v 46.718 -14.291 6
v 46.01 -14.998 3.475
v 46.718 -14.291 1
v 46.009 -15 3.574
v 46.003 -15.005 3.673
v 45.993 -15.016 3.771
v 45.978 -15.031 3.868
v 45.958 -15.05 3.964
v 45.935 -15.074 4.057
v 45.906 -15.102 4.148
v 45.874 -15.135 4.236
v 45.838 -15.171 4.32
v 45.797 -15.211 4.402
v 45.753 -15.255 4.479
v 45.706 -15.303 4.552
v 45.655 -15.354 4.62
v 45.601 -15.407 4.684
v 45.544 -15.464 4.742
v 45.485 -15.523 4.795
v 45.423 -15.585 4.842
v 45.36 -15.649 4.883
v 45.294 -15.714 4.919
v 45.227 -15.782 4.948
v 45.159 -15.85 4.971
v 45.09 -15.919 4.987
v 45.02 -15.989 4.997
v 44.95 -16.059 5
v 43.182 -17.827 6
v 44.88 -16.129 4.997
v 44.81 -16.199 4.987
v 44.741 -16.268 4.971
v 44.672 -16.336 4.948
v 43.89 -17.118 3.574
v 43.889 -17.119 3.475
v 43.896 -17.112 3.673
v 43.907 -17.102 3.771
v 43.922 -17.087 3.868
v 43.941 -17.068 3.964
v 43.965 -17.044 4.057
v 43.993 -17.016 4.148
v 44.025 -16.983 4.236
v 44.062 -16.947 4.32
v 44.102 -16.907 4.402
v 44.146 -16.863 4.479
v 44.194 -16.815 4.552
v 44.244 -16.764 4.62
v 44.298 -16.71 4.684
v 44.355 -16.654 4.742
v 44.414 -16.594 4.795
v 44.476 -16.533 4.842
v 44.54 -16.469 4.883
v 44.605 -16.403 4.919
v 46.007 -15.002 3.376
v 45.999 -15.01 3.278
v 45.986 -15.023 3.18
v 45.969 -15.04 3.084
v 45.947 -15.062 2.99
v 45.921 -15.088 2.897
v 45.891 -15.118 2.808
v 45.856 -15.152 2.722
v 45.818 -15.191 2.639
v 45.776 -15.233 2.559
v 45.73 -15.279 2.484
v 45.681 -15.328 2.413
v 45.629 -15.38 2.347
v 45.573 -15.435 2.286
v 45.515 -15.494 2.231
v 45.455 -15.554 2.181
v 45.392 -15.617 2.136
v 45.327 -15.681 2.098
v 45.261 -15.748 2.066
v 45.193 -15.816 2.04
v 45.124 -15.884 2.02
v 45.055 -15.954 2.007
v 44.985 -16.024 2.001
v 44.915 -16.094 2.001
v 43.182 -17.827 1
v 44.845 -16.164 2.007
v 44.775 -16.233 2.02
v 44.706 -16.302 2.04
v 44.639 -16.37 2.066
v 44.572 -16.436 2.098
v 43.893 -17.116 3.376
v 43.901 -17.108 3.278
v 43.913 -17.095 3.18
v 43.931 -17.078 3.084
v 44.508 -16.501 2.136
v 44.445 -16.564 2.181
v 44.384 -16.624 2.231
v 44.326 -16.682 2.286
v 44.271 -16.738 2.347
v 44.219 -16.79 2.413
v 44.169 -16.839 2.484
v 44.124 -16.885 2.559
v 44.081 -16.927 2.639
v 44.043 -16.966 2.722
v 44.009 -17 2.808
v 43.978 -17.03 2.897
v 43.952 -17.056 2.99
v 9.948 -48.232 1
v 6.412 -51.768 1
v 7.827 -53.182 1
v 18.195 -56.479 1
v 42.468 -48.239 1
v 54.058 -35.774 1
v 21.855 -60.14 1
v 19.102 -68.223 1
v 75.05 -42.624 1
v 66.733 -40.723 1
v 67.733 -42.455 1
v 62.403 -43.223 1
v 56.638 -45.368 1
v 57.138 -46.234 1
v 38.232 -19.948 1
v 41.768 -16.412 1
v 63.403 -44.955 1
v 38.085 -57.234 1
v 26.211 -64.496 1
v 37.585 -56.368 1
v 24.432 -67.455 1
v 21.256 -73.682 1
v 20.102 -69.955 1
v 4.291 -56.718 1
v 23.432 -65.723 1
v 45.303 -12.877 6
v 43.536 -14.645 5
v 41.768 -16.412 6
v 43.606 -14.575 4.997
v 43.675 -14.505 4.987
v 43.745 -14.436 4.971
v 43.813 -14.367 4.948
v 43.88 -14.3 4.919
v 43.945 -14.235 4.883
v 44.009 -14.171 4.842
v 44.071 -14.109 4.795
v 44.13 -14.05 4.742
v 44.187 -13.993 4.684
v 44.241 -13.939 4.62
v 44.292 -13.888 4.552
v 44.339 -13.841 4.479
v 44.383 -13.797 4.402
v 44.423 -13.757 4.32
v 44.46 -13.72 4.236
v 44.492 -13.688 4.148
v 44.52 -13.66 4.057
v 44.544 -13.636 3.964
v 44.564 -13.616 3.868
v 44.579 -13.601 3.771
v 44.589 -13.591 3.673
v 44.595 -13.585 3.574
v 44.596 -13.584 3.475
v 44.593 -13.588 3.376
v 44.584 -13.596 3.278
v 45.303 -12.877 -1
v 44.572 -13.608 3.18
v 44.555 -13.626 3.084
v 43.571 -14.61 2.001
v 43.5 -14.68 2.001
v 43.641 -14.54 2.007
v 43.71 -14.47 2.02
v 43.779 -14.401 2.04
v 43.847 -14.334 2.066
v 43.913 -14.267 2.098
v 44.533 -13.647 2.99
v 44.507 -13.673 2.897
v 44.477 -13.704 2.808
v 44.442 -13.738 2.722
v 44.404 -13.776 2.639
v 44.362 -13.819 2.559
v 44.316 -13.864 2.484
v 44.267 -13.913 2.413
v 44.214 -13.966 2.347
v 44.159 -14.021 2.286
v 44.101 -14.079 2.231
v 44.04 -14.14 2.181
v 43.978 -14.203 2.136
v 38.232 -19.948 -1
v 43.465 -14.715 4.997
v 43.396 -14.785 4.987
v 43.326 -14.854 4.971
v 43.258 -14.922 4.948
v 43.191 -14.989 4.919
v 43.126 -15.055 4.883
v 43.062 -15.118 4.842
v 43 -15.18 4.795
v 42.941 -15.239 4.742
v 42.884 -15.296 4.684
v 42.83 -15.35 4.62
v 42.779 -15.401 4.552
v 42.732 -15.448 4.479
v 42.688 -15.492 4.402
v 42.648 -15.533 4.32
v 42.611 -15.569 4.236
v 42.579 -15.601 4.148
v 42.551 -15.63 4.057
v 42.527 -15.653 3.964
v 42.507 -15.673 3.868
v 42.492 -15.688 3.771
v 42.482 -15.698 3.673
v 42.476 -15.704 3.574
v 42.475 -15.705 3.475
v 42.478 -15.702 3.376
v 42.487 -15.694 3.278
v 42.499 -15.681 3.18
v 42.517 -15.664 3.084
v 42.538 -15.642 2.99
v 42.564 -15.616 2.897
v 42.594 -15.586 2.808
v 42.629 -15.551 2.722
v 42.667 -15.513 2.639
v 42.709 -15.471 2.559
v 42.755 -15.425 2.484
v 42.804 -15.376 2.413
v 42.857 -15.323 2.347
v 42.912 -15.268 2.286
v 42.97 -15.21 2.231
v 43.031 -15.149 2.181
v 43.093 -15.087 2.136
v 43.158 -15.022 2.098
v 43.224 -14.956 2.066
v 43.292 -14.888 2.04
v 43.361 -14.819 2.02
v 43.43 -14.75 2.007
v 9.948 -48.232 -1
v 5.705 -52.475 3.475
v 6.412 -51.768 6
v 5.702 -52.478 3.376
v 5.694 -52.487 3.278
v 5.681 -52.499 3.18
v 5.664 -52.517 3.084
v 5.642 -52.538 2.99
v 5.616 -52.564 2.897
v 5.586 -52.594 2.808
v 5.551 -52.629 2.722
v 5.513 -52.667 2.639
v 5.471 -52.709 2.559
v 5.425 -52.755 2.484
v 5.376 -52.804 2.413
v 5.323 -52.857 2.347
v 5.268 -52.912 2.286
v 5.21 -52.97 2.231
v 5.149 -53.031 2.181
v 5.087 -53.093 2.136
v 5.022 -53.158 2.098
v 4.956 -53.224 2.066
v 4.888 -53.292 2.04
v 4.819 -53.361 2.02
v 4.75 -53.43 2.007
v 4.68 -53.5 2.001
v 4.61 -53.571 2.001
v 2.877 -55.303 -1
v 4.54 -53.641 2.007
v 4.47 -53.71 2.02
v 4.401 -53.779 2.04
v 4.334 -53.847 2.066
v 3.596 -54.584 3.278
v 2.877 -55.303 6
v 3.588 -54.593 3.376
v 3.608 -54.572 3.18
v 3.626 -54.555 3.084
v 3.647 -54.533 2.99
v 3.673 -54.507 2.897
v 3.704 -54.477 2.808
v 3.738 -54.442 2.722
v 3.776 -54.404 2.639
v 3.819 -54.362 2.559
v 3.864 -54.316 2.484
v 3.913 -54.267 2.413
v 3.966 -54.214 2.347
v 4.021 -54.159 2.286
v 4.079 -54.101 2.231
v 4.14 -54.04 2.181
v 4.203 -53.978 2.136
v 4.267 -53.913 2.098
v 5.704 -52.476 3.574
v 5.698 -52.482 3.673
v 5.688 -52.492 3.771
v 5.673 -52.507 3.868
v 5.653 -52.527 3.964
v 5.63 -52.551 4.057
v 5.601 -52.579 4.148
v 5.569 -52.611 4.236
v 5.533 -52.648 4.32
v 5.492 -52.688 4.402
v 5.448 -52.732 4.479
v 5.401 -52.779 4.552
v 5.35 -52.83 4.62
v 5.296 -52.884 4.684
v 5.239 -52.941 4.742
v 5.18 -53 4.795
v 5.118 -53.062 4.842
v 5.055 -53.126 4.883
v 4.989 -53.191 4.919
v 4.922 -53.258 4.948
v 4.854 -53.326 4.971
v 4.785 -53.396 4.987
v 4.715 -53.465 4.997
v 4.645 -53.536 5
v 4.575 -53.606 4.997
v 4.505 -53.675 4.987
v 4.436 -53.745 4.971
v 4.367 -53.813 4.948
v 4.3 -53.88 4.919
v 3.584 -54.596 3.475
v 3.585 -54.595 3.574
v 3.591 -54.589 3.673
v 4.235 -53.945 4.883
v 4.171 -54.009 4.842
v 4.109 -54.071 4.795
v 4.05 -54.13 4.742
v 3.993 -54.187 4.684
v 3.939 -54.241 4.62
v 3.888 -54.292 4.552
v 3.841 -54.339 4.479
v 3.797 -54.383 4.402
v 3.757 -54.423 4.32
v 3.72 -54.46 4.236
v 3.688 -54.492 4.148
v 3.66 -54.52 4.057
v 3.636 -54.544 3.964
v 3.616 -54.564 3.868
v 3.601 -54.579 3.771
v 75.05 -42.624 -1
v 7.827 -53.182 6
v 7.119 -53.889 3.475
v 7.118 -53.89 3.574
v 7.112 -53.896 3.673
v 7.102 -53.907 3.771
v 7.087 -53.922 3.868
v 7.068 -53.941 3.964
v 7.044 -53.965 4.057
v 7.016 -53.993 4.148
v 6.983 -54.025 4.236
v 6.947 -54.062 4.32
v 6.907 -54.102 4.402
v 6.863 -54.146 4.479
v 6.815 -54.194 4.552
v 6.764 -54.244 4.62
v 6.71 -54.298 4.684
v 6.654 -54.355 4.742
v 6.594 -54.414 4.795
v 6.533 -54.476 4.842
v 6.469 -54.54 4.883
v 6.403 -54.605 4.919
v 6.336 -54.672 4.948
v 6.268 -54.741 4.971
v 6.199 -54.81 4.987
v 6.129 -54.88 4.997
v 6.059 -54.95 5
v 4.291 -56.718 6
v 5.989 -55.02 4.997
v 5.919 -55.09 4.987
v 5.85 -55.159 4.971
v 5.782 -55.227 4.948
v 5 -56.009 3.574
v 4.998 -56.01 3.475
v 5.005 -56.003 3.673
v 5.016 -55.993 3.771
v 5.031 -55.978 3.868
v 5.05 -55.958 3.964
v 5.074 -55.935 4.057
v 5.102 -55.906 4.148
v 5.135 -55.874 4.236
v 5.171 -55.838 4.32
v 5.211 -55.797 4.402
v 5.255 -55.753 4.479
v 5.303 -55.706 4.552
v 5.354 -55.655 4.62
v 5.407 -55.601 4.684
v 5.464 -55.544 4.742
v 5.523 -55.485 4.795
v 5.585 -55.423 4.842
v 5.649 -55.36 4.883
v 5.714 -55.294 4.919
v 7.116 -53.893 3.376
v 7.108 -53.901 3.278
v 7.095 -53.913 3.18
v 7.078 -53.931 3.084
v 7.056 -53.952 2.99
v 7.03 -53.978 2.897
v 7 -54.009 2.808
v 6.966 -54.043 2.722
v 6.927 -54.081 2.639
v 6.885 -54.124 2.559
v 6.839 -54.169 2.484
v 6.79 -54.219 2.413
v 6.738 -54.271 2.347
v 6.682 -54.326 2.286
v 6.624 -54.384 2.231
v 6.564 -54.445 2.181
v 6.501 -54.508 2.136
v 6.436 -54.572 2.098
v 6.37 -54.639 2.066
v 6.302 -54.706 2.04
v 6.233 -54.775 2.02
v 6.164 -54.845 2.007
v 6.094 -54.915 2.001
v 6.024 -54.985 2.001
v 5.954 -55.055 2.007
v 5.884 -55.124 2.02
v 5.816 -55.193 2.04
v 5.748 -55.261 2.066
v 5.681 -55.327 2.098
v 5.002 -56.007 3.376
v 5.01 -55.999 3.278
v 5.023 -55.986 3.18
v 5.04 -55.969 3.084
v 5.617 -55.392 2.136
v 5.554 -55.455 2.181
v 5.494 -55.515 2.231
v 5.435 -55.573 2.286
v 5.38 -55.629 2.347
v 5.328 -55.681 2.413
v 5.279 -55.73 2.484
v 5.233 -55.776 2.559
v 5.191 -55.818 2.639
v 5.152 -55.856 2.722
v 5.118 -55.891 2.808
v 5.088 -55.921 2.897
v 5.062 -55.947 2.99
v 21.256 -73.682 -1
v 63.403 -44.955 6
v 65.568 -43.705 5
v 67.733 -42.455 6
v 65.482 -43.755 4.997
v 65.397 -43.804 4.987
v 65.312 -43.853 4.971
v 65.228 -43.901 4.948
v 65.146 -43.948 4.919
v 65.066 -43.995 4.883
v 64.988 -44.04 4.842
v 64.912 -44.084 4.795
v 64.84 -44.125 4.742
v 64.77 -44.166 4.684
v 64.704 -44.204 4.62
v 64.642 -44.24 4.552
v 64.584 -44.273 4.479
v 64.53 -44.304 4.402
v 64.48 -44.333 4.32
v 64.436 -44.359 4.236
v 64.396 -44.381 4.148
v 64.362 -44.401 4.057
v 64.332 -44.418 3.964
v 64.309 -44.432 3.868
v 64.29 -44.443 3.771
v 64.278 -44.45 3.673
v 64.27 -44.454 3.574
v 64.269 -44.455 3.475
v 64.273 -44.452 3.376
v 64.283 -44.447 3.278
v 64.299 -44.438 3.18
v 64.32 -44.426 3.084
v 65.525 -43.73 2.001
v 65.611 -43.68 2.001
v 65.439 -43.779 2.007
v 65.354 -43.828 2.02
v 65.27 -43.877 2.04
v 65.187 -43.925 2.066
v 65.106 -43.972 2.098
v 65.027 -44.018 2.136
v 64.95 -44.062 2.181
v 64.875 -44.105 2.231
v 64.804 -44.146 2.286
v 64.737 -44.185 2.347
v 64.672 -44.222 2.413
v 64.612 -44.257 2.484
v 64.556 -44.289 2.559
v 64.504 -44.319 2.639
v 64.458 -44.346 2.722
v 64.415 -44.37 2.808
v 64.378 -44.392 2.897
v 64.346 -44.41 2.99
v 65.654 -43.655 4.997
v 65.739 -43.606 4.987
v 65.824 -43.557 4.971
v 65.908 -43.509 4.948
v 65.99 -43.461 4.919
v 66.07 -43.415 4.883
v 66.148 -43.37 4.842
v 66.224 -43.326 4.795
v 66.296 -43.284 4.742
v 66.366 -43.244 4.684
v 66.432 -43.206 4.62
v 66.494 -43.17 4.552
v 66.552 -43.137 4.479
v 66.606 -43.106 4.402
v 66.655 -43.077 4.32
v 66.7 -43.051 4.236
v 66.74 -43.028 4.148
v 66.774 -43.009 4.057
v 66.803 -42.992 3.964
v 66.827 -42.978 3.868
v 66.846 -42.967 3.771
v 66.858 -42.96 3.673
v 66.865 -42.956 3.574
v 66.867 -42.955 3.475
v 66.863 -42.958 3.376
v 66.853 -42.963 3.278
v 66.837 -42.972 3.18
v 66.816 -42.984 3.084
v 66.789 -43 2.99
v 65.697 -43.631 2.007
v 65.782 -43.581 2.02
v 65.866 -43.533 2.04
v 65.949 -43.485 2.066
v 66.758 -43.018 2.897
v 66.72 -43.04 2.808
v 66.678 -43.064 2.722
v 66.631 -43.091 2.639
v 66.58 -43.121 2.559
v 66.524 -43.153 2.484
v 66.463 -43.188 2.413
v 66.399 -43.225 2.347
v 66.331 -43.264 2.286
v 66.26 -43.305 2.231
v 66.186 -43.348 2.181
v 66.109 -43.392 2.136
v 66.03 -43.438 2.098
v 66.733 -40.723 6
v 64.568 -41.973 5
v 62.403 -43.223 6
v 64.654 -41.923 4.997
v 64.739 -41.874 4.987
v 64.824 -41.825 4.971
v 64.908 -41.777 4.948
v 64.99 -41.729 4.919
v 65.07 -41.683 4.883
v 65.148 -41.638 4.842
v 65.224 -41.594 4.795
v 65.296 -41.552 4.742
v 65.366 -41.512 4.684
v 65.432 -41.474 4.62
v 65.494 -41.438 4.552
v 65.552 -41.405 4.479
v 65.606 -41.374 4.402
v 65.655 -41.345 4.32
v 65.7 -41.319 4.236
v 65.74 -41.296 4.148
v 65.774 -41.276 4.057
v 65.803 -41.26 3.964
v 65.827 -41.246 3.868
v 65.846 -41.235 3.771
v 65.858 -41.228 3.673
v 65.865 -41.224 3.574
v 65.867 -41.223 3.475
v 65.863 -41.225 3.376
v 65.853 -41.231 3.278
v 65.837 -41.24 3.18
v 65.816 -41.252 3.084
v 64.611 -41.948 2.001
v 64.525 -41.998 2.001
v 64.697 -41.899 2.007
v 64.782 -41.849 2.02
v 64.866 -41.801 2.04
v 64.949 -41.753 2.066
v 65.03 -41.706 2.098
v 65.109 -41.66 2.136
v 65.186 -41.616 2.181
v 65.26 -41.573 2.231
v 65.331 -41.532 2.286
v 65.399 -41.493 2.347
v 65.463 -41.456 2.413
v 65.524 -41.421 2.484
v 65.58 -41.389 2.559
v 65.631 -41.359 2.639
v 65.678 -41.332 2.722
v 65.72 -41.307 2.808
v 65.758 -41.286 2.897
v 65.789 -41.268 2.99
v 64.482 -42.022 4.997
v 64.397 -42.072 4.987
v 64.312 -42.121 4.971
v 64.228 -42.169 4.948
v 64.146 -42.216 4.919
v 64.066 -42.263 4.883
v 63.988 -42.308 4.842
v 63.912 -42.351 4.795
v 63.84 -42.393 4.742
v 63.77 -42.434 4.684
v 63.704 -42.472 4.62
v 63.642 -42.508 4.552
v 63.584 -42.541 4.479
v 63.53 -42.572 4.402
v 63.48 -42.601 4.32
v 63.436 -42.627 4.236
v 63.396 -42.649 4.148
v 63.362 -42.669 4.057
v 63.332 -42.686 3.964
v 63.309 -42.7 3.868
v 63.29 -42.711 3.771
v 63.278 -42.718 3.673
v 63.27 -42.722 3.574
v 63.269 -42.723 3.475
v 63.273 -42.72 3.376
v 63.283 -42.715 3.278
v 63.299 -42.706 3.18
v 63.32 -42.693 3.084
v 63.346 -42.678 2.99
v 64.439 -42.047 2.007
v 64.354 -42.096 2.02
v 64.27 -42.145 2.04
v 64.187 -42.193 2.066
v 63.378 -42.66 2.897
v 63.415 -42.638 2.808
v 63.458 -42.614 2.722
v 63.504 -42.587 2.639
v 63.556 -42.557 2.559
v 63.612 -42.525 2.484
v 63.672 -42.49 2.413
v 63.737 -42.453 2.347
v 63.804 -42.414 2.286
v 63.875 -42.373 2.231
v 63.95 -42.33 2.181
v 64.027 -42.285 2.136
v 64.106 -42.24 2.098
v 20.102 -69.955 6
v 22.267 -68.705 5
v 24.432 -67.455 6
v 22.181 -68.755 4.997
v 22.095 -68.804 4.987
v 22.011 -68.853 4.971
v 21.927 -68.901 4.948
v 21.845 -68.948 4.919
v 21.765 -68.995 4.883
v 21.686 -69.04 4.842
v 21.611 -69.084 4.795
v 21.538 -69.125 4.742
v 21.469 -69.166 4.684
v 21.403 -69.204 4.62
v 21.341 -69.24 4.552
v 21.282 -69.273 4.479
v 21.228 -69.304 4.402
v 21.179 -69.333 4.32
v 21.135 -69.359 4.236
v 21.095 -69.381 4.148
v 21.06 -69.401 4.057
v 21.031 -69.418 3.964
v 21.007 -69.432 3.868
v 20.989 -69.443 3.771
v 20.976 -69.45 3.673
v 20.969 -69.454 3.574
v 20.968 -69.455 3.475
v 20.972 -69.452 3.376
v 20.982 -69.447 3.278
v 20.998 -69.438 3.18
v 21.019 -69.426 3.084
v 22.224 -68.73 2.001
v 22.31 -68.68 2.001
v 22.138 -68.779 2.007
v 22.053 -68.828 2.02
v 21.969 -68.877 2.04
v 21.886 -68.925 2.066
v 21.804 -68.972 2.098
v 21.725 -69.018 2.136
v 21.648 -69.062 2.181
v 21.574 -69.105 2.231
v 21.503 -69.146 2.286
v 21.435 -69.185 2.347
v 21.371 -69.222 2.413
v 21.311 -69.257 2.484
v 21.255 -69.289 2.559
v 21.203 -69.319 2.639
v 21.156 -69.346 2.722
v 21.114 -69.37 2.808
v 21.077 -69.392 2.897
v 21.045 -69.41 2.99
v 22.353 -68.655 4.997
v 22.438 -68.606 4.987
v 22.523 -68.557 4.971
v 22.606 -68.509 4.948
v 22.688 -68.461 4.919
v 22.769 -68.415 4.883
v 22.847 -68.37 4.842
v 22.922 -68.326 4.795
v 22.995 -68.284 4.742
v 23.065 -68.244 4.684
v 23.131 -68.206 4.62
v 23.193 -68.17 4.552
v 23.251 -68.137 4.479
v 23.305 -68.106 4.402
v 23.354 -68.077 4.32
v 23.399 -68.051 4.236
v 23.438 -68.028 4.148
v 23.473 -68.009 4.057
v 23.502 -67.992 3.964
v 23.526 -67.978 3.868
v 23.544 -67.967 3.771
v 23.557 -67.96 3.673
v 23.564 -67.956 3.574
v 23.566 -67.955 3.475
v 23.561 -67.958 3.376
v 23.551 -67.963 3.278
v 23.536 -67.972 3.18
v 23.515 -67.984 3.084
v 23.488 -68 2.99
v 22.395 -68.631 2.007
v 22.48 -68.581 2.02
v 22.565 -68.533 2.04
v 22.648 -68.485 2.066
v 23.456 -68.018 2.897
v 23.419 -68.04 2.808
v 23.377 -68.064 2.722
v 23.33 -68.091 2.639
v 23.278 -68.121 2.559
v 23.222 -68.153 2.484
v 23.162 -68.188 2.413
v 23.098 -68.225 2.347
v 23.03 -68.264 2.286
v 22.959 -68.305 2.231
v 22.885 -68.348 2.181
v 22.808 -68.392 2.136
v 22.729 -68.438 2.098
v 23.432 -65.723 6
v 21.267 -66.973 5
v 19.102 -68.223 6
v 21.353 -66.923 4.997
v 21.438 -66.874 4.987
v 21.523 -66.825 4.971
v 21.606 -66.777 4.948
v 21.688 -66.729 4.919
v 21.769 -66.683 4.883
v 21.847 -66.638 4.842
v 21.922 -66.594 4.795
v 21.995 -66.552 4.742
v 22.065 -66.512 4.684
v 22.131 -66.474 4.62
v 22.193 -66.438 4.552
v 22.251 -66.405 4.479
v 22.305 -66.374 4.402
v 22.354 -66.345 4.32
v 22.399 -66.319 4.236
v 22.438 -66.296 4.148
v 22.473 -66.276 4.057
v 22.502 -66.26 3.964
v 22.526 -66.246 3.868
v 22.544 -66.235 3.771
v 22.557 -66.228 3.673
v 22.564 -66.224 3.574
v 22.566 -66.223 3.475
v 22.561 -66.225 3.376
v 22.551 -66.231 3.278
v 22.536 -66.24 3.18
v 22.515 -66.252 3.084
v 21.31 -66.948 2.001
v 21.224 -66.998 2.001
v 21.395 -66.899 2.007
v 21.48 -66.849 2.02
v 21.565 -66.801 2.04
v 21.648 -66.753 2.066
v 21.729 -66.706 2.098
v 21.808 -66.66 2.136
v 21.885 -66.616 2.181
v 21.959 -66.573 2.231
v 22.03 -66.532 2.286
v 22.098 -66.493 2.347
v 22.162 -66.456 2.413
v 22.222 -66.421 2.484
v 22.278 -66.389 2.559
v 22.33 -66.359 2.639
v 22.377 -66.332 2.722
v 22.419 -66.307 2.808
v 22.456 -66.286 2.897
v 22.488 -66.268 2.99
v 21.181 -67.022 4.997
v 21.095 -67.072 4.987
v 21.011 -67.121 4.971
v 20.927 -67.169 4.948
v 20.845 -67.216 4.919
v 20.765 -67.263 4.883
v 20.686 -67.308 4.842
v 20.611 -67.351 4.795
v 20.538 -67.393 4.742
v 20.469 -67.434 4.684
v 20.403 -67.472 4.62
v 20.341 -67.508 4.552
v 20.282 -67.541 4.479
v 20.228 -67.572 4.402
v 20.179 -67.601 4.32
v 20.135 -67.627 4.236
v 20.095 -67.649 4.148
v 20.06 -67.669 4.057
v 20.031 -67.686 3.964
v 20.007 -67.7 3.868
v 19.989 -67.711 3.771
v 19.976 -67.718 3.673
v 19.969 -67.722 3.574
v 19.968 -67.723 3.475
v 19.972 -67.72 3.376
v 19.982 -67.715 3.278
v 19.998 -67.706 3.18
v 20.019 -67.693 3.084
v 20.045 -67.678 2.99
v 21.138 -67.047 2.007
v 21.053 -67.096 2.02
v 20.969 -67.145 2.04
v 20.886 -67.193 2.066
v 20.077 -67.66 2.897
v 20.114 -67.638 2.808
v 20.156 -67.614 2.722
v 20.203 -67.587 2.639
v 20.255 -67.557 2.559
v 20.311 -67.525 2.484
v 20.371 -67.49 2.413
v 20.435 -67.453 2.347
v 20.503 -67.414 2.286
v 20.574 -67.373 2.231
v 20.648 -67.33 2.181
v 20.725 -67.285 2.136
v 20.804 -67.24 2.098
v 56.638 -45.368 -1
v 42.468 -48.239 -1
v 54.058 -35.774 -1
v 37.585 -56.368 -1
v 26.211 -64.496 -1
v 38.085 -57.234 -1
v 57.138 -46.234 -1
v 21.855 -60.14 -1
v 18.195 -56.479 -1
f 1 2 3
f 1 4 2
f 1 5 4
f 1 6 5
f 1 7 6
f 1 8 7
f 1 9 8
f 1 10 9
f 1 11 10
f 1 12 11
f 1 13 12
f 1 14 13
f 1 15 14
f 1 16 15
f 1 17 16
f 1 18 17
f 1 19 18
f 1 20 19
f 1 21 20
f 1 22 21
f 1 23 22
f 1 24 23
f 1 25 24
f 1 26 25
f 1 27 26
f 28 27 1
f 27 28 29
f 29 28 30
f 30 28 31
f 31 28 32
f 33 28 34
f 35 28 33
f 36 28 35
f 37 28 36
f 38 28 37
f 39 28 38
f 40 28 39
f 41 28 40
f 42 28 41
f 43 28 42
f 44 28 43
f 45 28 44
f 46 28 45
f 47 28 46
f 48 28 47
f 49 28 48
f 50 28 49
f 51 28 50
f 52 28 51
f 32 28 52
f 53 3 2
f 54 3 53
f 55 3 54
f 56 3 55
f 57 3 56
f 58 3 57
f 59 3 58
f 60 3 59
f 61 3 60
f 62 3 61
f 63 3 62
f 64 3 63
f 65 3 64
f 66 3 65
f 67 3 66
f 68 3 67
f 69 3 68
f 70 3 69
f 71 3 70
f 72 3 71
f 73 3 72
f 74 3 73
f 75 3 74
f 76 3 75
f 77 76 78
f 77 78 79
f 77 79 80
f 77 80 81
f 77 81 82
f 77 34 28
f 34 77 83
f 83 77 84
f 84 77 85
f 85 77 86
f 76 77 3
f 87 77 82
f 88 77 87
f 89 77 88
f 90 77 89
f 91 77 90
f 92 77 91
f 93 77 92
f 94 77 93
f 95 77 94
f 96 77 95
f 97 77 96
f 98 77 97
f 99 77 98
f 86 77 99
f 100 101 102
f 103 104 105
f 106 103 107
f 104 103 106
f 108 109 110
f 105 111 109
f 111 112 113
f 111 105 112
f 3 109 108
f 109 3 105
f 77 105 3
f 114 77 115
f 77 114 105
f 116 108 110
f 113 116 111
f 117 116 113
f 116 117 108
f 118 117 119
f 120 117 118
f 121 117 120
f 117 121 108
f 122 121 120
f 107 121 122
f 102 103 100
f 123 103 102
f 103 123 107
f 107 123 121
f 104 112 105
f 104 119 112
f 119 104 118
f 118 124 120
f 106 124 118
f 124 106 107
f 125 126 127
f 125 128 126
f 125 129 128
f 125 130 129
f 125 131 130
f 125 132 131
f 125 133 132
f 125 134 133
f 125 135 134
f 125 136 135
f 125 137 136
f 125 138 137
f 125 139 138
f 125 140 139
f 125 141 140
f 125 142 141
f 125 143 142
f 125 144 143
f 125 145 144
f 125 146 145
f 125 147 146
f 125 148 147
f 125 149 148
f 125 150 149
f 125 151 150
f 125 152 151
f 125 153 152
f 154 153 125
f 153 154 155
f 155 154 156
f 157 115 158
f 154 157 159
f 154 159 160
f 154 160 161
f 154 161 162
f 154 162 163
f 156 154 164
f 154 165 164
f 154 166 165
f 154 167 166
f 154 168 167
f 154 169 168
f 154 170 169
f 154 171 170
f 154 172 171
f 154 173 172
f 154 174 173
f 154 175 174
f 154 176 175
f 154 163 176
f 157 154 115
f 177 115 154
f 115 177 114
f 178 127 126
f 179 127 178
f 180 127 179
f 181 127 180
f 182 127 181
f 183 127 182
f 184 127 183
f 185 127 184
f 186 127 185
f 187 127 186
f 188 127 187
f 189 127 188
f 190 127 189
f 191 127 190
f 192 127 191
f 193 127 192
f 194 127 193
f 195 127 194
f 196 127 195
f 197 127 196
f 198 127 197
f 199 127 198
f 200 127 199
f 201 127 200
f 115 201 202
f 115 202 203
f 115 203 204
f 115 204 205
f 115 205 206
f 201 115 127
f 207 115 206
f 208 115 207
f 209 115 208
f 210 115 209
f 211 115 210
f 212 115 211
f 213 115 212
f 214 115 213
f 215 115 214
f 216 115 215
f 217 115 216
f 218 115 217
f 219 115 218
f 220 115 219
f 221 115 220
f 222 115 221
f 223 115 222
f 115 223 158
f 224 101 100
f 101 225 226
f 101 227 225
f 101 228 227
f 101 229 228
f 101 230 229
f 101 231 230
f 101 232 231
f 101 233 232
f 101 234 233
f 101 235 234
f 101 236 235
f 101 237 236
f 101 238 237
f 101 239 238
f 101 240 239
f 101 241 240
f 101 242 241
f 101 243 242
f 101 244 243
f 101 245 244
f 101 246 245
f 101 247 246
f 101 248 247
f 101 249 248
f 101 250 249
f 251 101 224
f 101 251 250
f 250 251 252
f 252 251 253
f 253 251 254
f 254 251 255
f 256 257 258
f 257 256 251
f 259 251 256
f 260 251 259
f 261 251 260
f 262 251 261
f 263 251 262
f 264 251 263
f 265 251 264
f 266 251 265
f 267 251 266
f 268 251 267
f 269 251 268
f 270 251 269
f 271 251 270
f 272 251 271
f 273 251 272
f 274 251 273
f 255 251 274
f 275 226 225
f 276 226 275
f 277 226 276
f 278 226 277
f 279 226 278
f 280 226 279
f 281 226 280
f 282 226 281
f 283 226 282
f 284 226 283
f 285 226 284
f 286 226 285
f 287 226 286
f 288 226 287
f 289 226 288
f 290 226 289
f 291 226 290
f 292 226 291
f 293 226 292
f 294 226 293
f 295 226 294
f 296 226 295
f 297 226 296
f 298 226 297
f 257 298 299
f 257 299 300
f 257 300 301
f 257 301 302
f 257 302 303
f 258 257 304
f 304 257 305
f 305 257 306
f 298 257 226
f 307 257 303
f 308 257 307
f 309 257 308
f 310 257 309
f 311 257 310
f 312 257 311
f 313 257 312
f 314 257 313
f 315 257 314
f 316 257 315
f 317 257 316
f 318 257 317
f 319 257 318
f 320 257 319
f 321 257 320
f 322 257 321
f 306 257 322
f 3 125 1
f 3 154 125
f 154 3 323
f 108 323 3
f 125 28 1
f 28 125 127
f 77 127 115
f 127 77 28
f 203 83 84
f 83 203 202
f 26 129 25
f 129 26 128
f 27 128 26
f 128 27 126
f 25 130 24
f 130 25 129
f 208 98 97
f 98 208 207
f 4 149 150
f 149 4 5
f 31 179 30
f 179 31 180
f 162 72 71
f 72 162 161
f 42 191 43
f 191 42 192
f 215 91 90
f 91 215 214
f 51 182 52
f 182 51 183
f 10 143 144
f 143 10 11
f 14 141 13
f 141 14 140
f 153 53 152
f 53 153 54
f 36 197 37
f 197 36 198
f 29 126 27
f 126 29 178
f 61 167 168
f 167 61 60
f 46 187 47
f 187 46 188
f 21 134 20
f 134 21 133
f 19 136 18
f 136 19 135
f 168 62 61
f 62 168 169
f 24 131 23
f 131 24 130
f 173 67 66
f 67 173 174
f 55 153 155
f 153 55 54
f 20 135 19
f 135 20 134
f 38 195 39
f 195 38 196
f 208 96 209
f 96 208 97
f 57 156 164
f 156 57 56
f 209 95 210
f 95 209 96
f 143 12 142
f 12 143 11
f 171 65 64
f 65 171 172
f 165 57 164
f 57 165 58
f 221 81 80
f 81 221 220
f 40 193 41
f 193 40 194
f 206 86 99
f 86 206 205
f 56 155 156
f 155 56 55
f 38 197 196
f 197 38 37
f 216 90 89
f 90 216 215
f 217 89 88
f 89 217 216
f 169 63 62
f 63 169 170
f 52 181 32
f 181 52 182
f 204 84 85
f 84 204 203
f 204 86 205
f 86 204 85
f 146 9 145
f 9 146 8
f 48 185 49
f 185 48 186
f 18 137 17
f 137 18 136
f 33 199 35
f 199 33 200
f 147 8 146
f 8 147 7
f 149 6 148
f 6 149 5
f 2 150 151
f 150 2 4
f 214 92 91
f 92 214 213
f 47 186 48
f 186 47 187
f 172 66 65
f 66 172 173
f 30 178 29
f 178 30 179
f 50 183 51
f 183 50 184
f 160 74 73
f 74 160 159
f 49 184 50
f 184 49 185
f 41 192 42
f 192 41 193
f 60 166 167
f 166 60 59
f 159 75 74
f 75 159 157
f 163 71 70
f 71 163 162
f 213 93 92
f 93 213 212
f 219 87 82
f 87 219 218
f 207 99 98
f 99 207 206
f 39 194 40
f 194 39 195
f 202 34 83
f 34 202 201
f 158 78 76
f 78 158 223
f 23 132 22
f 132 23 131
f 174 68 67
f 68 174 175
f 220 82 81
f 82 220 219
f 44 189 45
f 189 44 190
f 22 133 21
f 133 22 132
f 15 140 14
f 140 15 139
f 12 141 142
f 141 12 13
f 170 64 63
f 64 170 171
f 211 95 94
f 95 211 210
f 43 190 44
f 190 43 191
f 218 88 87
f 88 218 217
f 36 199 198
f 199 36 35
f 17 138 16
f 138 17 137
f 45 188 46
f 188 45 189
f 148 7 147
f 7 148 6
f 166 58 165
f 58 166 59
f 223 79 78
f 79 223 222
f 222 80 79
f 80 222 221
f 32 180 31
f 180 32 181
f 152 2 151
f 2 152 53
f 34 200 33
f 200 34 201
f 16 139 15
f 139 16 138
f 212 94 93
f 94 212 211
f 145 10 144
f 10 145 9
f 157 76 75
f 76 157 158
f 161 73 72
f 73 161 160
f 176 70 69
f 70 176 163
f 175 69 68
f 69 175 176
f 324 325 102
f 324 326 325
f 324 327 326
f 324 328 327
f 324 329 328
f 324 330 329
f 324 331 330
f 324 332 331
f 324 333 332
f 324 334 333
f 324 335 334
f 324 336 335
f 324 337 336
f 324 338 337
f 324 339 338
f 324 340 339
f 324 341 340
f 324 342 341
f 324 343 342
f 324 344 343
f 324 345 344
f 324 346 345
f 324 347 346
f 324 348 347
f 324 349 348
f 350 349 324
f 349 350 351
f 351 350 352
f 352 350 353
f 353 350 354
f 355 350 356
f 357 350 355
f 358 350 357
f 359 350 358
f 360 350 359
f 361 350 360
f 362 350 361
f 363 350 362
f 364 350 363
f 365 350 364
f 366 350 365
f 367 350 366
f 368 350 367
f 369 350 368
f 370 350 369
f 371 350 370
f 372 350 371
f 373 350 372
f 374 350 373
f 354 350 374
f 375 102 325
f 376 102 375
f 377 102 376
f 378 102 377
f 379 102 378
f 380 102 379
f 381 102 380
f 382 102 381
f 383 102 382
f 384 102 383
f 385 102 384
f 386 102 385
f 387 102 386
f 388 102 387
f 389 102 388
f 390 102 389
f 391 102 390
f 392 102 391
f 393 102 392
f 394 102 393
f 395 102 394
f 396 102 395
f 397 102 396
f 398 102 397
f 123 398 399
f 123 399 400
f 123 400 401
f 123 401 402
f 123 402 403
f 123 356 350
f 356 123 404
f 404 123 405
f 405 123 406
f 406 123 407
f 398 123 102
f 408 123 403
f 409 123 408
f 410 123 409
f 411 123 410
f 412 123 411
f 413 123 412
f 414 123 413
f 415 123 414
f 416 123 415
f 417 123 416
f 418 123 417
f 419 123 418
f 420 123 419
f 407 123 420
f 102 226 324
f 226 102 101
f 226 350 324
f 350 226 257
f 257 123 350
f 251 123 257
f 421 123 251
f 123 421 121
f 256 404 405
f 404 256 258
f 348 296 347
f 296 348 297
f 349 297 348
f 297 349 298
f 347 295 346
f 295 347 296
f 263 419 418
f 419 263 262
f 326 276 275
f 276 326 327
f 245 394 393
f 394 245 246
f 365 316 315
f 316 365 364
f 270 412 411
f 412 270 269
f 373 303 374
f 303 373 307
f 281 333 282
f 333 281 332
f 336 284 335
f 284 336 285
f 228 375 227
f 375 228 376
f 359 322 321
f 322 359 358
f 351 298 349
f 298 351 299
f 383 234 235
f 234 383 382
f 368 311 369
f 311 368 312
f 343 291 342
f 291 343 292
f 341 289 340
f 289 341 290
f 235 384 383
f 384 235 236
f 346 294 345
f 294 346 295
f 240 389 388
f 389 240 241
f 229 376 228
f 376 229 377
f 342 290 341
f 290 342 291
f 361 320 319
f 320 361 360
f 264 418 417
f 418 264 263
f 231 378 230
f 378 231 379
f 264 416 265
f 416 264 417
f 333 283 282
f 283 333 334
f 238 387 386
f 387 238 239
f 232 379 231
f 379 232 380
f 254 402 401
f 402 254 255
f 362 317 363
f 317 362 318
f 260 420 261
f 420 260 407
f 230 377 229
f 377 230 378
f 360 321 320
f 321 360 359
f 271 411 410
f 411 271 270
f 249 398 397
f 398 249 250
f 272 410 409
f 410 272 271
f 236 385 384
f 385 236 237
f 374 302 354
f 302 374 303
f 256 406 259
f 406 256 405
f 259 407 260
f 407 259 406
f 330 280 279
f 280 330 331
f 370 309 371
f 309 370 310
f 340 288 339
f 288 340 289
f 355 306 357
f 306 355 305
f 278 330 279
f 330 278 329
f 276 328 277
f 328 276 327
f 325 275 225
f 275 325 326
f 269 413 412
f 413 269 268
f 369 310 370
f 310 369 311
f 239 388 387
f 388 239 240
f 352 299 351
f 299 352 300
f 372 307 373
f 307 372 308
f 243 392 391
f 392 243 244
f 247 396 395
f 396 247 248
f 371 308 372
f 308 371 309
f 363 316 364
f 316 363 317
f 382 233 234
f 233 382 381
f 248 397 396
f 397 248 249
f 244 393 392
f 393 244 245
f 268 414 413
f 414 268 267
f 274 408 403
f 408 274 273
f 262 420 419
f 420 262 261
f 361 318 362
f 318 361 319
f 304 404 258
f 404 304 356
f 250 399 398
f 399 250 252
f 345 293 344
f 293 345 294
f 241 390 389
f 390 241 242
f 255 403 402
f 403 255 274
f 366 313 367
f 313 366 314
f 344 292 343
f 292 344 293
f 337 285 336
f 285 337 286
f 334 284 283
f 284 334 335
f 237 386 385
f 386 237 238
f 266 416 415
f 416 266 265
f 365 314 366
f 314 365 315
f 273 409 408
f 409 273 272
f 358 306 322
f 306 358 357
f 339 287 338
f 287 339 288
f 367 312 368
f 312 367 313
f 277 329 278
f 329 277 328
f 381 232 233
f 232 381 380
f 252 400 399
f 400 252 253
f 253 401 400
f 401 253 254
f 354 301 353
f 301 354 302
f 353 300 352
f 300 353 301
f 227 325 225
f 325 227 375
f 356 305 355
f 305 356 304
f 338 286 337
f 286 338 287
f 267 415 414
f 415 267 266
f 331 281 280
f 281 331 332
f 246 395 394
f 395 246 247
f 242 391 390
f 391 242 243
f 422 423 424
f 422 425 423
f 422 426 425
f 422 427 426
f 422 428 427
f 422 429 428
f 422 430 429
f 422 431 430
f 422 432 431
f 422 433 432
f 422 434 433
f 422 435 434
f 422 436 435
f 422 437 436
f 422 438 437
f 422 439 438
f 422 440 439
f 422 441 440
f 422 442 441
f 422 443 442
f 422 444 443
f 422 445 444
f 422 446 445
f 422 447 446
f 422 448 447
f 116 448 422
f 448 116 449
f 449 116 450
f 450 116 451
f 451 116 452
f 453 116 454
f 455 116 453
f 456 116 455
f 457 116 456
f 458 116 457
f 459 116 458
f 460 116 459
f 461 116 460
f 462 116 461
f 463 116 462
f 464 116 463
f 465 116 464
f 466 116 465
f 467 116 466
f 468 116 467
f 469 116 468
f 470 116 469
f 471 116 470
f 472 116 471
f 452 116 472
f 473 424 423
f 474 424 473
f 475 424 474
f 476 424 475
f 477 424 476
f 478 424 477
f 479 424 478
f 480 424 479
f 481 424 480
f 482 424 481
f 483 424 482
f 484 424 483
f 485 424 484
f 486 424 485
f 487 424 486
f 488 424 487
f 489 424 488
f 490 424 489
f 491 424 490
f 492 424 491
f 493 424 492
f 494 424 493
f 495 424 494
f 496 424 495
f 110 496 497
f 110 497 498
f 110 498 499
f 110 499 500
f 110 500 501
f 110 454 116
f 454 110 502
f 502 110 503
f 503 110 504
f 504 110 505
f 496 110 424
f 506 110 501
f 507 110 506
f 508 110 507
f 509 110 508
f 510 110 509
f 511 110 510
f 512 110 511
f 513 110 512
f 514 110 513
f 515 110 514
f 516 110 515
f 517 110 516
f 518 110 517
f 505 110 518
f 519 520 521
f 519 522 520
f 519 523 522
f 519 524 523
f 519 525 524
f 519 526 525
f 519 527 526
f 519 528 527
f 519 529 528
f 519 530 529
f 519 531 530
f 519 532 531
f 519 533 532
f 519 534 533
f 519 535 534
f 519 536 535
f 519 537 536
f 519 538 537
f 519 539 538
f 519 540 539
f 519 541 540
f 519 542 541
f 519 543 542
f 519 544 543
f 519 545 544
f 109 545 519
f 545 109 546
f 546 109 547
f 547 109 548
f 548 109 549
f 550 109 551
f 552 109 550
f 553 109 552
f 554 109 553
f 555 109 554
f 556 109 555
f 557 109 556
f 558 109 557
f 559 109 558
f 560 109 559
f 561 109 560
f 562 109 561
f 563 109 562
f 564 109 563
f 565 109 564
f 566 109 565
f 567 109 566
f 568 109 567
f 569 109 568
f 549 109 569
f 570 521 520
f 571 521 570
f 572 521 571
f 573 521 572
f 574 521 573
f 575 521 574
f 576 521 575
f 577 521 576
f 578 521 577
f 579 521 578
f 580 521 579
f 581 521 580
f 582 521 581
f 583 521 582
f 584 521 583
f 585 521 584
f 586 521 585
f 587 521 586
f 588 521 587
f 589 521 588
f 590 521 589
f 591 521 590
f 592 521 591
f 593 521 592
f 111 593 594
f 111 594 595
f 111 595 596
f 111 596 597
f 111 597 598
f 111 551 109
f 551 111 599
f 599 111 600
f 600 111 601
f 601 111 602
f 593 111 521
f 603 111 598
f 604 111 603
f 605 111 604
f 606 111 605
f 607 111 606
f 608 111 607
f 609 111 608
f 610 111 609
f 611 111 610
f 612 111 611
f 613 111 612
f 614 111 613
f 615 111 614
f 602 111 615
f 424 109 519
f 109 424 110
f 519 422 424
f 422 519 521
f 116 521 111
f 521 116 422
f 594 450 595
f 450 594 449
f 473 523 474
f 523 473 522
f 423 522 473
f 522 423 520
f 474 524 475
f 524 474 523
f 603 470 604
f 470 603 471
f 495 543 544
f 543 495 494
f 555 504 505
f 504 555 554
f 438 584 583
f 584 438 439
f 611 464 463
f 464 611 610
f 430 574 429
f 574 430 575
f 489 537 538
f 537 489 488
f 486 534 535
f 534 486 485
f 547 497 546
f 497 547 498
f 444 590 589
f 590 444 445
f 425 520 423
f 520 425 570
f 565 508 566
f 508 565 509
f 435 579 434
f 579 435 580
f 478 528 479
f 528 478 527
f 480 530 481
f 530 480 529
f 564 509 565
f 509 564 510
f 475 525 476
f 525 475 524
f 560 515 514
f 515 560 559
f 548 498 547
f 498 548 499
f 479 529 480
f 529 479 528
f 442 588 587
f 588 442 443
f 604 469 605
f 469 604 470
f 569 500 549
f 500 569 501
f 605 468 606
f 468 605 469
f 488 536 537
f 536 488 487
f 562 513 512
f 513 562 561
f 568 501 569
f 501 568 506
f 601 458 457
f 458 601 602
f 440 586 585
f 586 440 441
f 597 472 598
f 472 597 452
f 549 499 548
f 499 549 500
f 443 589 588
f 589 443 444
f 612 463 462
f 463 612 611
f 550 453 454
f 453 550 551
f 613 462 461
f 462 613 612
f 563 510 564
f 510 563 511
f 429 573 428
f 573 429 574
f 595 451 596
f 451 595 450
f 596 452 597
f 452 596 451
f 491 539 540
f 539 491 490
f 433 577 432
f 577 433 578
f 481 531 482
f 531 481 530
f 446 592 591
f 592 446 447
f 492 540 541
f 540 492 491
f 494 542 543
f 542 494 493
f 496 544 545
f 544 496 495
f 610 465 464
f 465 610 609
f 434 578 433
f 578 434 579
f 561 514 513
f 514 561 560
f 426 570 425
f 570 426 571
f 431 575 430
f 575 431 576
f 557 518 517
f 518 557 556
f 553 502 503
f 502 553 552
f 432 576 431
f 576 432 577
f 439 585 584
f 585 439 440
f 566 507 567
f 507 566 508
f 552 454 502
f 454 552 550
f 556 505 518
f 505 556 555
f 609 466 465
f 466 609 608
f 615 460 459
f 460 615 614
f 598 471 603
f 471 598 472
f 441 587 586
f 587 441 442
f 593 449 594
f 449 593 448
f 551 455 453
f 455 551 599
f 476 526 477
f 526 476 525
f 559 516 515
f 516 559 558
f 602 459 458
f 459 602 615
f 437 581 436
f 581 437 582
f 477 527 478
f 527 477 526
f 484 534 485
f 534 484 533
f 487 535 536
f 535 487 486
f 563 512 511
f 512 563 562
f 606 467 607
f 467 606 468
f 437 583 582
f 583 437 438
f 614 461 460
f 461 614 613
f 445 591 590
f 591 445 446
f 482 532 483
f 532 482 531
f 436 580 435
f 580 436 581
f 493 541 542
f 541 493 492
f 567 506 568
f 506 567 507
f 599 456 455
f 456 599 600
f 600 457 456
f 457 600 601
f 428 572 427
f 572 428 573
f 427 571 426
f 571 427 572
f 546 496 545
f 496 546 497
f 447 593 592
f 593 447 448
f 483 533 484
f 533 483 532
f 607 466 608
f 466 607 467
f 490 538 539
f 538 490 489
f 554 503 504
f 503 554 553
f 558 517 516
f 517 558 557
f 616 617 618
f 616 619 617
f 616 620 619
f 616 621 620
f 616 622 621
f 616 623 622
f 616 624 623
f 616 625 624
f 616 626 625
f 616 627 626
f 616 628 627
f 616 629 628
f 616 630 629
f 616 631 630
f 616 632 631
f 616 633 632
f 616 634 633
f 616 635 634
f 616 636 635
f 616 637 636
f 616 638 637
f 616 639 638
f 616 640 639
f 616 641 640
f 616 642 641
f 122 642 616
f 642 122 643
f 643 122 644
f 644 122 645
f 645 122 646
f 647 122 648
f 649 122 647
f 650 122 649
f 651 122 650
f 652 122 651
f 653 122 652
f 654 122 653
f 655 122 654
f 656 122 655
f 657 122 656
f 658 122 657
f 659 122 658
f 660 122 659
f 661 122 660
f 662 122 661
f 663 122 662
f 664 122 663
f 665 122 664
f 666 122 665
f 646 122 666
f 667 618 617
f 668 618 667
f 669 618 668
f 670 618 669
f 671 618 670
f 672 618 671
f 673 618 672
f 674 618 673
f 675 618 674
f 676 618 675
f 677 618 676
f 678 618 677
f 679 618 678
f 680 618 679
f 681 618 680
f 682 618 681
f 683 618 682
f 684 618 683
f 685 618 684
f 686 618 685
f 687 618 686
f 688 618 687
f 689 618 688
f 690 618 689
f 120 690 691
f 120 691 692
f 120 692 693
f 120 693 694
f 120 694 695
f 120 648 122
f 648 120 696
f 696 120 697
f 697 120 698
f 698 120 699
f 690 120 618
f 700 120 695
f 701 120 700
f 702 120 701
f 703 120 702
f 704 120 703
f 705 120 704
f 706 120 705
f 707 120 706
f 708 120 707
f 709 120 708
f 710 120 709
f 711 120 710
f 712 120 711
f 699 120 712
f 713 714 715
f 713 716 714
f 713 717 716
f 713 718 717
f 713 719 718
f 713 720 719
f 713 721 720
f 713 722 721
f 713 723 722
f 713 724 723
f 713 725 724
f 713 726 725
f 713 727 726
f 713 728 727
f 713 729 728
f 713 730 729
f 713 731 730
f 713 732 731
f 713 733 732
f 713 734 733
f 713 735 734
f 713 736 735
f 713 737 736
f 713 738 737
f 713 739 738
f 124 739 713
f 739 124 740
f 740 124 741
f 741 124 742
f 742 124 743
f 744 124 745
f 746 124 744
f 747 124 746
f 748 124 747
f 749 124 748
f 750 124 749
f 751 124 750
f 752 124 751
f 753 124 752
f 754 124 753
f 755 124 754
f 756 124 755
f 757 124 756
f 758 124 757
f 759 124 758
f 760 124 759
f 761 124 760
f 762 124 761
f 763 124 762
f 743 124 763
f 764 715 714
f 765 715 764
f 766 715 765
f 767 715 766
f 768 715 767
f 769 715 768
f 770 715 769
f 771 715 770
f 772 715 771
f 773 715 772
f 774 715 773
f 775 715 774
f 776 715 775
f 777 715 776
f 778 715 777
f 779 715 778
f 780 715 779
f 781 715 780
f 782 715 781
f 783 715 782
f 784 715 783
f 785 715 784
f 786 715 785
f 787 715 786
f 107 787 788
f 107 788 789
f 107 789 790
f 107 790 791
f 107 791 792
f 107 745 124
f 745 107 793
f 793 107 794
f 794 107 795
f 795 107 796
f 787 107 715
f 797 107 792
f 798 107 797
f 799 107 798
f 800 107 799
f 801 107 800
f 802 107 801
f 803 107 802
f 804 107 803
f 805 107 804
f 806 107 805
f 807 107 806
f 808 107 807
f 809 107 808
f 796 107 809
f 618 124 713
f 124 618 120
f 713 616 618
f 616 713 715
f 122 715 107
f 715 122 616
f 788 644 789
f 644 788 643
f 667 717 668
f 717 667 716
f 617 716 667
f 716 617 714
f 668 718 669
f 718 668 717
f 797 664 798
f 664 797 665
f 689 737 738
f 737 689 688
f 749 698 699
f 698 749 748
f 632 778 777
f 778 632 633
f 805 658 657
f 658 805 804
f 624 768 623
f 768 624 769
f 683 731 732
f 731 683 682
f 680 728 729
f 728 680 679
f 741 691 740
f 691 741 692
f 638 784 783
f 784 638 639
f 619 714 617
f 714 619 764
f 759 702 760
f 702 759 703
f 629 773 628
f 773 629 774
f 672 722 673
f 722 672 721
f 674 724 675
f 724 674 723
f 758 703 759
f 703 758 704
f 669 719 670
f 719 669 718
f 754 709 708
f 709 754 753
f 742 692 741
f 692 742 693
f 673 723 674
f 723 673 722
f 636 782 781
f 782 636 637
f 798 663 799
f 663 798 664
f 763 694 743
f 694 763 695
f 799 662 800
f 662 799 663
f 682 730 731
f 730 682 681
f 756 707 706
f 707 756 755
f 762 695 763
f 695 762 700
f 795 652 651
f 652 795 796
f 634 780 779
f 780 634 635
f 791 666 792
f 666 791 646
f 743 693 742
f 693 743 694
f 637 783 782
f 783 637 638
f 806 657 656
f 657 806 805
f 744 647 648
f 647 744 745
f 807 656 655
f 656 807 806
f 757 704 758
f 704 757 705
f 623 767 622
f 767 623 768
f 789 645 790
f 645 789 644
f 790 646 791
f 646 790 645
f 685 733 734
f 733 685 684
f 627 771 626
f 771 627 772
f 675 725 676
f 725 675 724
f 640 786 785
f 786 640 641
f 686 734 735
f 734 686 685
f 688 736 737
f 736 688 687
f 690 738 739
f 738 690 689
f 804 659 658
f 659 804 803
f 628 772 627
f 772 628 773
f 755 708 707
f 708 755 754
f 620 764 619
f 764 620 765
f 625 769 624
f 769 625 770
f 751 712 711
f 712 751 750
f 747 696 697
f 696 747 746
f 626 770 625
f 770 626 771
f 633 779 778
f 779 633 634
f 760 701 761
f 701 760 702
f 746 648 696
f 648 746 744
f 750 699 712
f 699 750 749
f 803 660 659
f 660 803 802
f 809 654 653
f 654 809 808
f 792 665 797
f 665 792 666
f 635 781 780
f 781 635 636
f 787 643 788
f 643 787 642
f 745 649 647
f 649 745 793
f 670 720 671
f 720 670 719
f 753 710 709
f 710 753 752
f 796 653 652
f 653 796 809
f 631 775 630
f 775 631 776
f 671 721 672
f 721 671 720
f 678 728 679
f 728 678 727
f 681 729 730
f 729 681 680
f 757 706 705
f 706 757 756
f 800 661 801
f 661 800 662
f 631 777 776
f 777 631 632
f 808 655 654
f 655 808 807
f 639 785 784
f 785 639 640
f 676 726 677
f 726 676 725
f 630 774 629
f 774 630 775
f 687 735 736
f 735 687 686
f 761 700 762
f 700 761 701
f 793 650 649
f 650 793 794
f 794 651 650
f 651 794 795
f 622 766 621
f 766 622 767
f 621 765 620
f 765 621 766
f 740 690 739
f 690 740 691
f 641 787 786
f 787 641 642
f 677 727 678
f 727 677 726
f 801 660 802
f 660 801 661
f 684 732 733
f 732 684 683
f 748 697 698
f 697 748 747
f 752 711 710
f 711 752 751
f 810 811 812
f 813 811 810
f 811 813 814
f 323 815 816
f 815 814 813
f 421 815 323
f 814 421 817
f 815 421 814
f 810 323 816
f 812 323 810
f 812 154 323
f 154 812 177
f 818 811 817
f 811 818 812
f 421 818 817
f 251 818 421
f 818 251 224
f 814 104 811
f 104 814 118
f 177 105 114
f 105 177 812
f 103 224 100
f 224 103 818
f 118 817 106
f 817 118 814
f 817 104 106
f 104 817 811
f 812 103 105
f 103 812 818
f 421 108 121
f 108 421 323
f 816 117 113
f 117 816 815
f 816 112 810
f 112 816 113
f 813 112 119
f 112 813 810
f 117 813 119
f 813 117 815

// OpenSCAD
// Tristan Van Cise
// CS 680 - 3D Printing and Robotics
// Homework 2 - OpenSCAD
// 09/16/2018
//
// Modularish drone frame designed for racing sized quad-copters
// with CC3D sized flight controllers (3mm X 3mm) and 
// KV2600 BR2205 motors.
//


/*******************************************************************
*   // Change to true to see a rough model of the assembled frame  *
*                                                                  *
*/    show_assembled_model = false;                                /*
*                                                                  *
********************************************************************/

// General Variables
screwSize = 3; // m3 by default
enclosure_extrude_height = 2;

// CAUTION: Smaller thickness could lead to
// screws boring through motor coils
drone_arm_thickness = 4; 

// Circle Edge Smoothness
$fa = 1;
$fs = 0.1;

// Motor mount
motor_key_radius = 8;
motor_mount_radius = 20;
motor_screw_distance_from_center = 8.5;
motor_mount_to_arm_transition_length = 27;

// Arm
arm_width = 20;
arm_length = 60;
distance_to_arm_end = 1.5*motor_mount_to_arm_transition_length+(arm_length);
  
// Body
body_width = 45;
body_height = 90;
arm_angle_from_body = 45;

// Enclosure
enclosure_width  = 60;
enclosure_height = 45;
enclosure_thickness = 2;
antenna_radius = 2;
   
/*************/
/** Modules **/
/*************/

module motor_mount_base() {
    difference() {
        hull() {
            circle(r=motor_mount_radius);
            motor_mount_to_arm_transition_piece();
        }
        circle(r=motor_key_radius);
    }
}   

module motor_mount_to_arm_transition_piece() {
    translate([0,motor_mount_to_arm_transition_length,0])
        square([arm_width,motor_mount_to_arm_transition_length],center=true);
}

// The holes for the motors are ellipses due to
// varying motor screw hole distances from
// different manufacturers.
module motor_screw_holes() {
    translate([-motor_screw_distance_from_center,-motor_screw_distance_from_center]) {
        motor_screw_ellipse(screwSize+2,screwSize);
        
        translate([2*motor_screw_distance_from_center,0]) 
            mirror([0,1,0]) 
                motor_screw_ellipse(screwSize+2,screwSize);
    }
    
    translate([motor_screw_distance_from_center,motor_screw_distance_from_center]) {
        motor_screw_ellipse(screwSize+2,screwSize);
        
        translate([-2*motor_screw_distance_from_center,0])
            mirror([0,1,0])
                motor_screw_ellipse(screwSize+2,screwSize);
    }
}    
    
module motor_screw_ellipse(radiusX,radiusY) {
    rotate([0,0,45])
        resize([radiusX,radiusY])
            circle(r=10);
}

module motor_mount() {
    difference() {
        motor_mount_base();
        motor_screw_holes();
    }
}

module arm() {
    
    translate([0,1.5*motor_mount_to_arm_transition_length+(0.5*arm_length),0])
    square([arm_width,arm_length],center=true);
}


module arm_to_body_screw_holes() {
    align_to_corners_on_body() {
    linear_extrude(height = 7, center = true, convexity = 10) {
        translate([5,distance_to_arm_end-5])
            circle(r=0.5*screwSize,center=true);
        
        translate([-5,distance_to_arm_end-5])
            circle(r=0.5*screwSize,center=true);
        
        translate([0,distance_to_arm_end-10])
            circle(r=0.5*screwSize,center=true);
    }
    }
}

module cc3d_screw_holes() {
    translate([15,15])
        circle(r=0.5*screwSize,center=true);
    translate([-15,15])
        circle(r=0.5*screwSize,center=true);
    translate([15,-15])
        circle(r=0.5*screwSize,center=true);
    translate([-15,-15])
        circle(r=0.5*screwSize,center=true);
}

module arm_end_screw_holes() {
        translate([5,distance_to_arm_end-5])
            circle(r=0.5*screwSize,center=true);
        
        translate([-5,distance_to_arm_end-5])
            circle(r=0.5*screwSize,center=true);
        
        translate([0,distance_to_arm_end-10])
            circle(r=0.5*screwSize,center=true);     
}

module drone_arm(extrude=true) { 
    motor_mount();
    difference() {
        arm();
        if(extrude) {
            linear_extrude(height = 7, center = true, convexity = 10)
                arm_end_screw_holes();       
        } else {
            arm_end_screw_holes();
        }
    }
}

module align_arm(x=1,y=1,angle) {
    translate([x*(0.5*body_width+arm_length),y*(0.5*body_height+arm_length),0]) { 
        rotate([0,0,angle]) {
            children();
        }
    }
}

module body_base() {
    difference() {
        square([body_width,body_height],center=true);
        cc3d_screw_holes();
    }
}


module align_to_corners_on_body() {
    align_arm(1,-1,arm_angle_from_body) 
        children();
    
    align_arm(-1,-1,-arm_angle_from_body) 
        children();
    
    align_arm(-1,1,180+arm_angle_from_body) 
        children();
    
    align_arm(1,1,-180-arm_angle_from_body) 
        children();
}

module body_and_arms() {
    
    body_base();
    align_to_corners_on_body() {
        translate([0,0,-0.32*3])
        drone_arm();
    }
    
}

module body_and_arms_difference() {
    difference() {
    linear_extrude(height = drone_arm_thickness+1, center = true, convexity = 5)
    body_base();
    align_to_corners_on_body() {
        translate([0,0,-0.32*3])
        linear_extrude(height = drone_arm_thickness, convexity = 5)
        drone_arm();
    }
    }
}

module enclosure_wall() {
    union() {
    difference() {
        union() {
            linear_extrude(height = enclosure_extrude_height, convexity = 10, center=true)
            square([enclosure_height,enclosure_width],center=true);
            rotate([0,90,0]) {
                translate([0.5*enclosure_extrude_height, 0.5*enclosure_width-5, 0.5*enclosure_height-1]) {
                    difference() {
                        linear_extrude(height = 2, convexity = 10, center=true)
                        square([5,5]);
                            translate([2.5,2.5])
                                cylinder(r=0.5*screwSize, h=3, center=true);
                    }
                    
                    translate([0, -enclosure_width+5,0]){
                        difference() {
                            linear_extrude(height = 2, convexity = 10, center=true)
                            square([5,5]);
                                translate([2.5,2.5])
                                    cylinder(r=0.5*screwSize, h=3, center=true);
                        }
                    }
                }
            }
                translate([-13.35+2*(13.35/20),20+0.25*(20/13.35),-0.5*enclosure_extrude_height]) {
                    rotate([-15,90,0]){
                        
                    difference() {
                    linear_extrude(height = 2, convexity = 10, center=true)
                    square([5,5]);
                        translate([2.5,2.5])
                            cylinder(r=0.5*screwSize, h=3, center=true);
                    }
                    
                    translate([0,-50,0]) {
                        difference() {
                            linear_extrude(height = 2, convexity = 10, center=true)
                            square([5,5]);
                            translate([2.5,2.5])
                                cylinder(r=0.5*screwSize, h=3, center=true);
                        }
                    }
                    }
                }
            
       }
       difference() {
           translate([enclosure_height/4,0,0])
            linear_extrude(height = 20, convexity = 10, center=true)
               square([(enclosure_height/2)+1,enclosure_width/1.5],center=true);
           translate([7,-25,0]) 
            rotate([0,0,15]) 
                linear_extrude(height = 20, convexity = 10, center=true) {
                    square([5,50]);
                }
            }
       
       // side slice
       translate([-40,0,0]) 
            rotate([0,0,15]) 
                linear_extrude(height = 20, convexity = 10, center=true) {
                    square([55,80],center=true);
                }
                
       // velcro
       translate([-7+0.5*1.75,4+(4/14),0]) 
            rotate([0,90,15]) 
                linear_extrude(height = 1, convexity = 10, center=true) {
                    square([22,22],center=true);
                }
   }
   
   }
}

module counter_sunk_screw_hole() {
    
        translate([0,0,-2.5])
            cylinder(r=0.75*screwSize, h=2);
        cylinder(r=0.5*screwSize, h=5, center=true);
    
}

module enclosure_roof_and_screws(shift_factor=0) {
    difference() {
    translate([0,0,31.5+shift_factor]) {
        rotate([15,0,0]) {
            linear_extrude(height = 2, center = true, convexity = 10)
            difference() {
                square([30-enclosure_extrude_height,62],center=true);
                
                translate([0,-25,0])
                    circle(r=antenna_radius, center=true);
            }
        }
    }
    
    // NEEDS REFACTOR
    translate([15,0,22.5]) { 
        rotate([0,90,0]) {
            translate([-13.35-shift_factor,20,-0.5]) { 
                rotate([-15,90,0]) {
                    translate([2.5+1,2.5]){
                        counter_sunk_screw_hole();
                        translate([24-2,0,0])
                            counter_sunk_screw_hole();
                            translate([24-2,-50,0])
                                counter_sunk_screw_hole();
                                translate([0,-50,0])
                                    counter_sunk_screw_hole();
                    }
                }
            }
        }
    }
}
}

module body_enclosure(shift_factor=0) {
    union() {
        difference() {
            translate([15,0,22.5+shift_factor]) {
                rotate([0,90,0]) {
                    
                    enclosure_wall();
                }
                mirror([0,0,1]) {
                    rotate([0,-90,0]) 
                    translate([0,0,30])
                   
                    enclosure_wall();
                }
            }
        
        }
    
        enclosure_roof_and_screws(shift_factor);
    }   
}

module enclosure_to_body_screw_holes(){
    translate([15-enclosure_extrude_height-1.25,0.5*enclosure_height+5,0])
    cylinder(r=0.5*screwSize, h=7, center=true);
    
    translate([15-enclosure_extrude_height-1.25,-0.5*enclosure_height-5,0])
    cylinder(r=0.5*screwSize, h=7, center=true);
    
    mirror([1,0,0])
    translate([15-enclosure_extrude_height-1.25,0.5*enclosure_height+5,0])
    cylinder(r=0.5*screwSize, h=7, center=true);
    
    mirror([1,0,0])
    translate([15-enclosure_extrude_height-1.25,-0.5*enclosure_height-5,0])
    cylinder(r=0.5*screwSize, h=7, center=true);
}

module four_arms_separated() {
    translate([73,40-arm_length/2]) {
        linear_extrude(height=drone_arm_thickness, center=true, convexity=5) {
            drone_arm(false);
            translate([-35,40+distance_to_arm_end/2 - 7])
            rotate([0,0,180])
            drone_arm(false);
            mirror([1,0,0]) {
            translate([146,40-distance_to_arm_end/2 + 7]){
                drone_arm(false);
                translate([-35,40+distance_to_arm_end/2 - 7])
                rotate([0,0,180])
                drone_arm(false);
            }
            }
        }
    }
}

module two_enclosure_walls_separated() {
        union() {
            translate([40,-50,0])
            rotate([0,180,-45]) {
            enclosure_wall();
            } /*
            mirror([0,0,1]) {
            translate([-40,-50,0])
            rotate([0,0,45])
            enclosure_wall();
        } */
    }
}

module segmented_drone_frame() {
    /*
    difference() {
        body_and_arms_difference();
        arm_to_body_screw_holes();
        enclosure_to_body_screw_holes();
    } */
    
    two_enclosure_walls_separated();
    /*
    translate([0,70,-30])
    rotate([-15,0,0])
    enclosure_roof_and_screws();
     
    four_arms_separated();
    */
}

module drone_frame() {
    difference() {
        linear_extrude(height = 5, center = true, convexity = 5)
        body_and_arms();
        arm_to_body_screw_holes();
        enclosure_to_body_screw_holes();
    } 
    body_enclosure(drone_arm_thickness-1.5);
}
    

if(show_assembled_model)
    drone_frame();
else
    segmented_drone_frame();
